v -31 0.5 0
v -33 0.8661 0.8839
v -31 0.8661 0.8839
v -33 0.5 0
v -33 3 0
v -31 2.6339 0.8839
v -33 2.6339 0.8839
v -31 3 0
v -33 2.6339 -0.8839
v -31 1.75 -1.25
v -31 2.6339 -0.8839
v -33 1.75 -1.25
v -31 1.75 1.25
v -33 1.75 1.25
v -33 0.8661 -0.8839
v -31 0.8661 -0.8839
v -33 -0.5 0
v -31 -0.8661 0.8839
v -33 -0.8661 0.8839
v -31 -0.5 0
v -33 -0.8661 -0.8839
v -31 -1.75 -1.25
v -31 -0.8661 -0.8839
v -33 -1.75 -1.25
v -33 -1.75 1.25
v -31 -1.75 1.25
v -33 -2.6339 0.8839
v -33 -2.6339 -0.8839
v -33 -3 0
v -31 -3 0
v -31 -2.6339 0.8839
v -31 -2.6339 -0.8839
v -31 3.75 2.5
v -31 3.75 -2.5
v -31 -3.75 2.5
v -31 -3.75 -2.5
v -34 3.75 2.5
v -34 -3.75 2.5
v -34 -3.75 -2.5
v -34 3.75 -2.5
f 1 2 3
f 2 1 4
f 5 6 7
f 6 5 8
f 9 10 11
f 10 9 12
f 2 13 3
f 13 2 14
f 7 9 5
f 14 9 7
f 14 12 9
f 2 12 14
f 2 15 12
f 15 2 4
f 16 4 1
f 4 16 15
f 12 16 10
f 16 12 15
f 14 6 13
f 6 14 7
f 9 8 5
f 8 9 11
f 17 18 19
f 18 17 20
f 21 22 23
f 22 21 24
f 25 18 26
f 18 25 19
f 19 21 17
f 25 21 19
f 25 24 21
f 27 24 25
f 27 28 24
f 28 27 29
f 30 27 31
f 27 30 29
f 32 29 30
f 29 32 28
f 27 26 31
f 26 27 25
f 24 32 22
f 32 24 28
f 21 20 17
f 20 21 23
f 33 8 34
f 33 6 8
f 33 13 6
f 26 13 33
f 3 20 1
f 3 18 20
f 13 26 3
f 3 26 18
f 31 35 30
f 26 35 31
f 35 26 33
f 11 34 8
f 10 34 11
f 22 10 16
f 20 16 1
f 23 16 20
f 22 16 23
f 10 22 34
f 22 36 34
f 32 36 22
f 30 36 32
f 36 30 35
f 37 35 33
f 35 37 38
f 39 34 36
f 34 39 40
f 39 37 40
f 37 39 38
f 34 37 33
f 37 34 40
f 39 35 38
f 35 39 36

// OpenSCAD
// file: ../motors/MN5212.scad
use <../utils.scad>

module MN5212(){

	render(){
		translate([0,0, 42.5 / 2 - 23 / 2 - 4.9 - 6])
			cylinder(
				h = 23,
				r = 59 / 2,
				$fa = fa(59 / 2),
				center = true);
		translate([0,0, 42.5 / 2 - 4.9 / 2 - 6])
			cylinder(
				h = 4.9,
				r1 = 59 / 2,
				r2 = 24.8 / 2,
				$fa = fa(59 / 2),
				center = true);
		translate([0,0, - 42.5 / 2 + 5.6 / 2 + 3])
			cylinder(
				h = 5.6,
				r1 = 44 / 2,
				r2 = 59 / 2,
				$fa = fa(59 / 2),
				center = true);
		translate([0, 0, 42.5 / 2 - 3])
			cylinder(
				h = 6,
				r = 4 / 2,
				$fa = fa(4 / 2),
				center = true);
		translate([0, 0, - 42.5 / 2 + 1.5])
			cylinder(
				h = 3,
				r = 6 / 2,
				$fa = fa(6 / 2),
				center = true);
	}

}
// file: ../servos/HS_5065MG.scad
use <../utils.scad>

module HS_5065MG(){

	length = 23.75;
	width = 11.68;
	depth = 20.32;
	wing_width = 32.38;
	wing_thick = 3.43;
	shaft_offset = 6;
	hole_spacing = 28.32;
	shaft_height = 26.16;
	shaft_length = 2;

	module mounting_hole(){
		mh_rad = 2 / 2;
		translate(
			[
				hole_spacing / 2,
				0,
				depth / 2 - wing_thick / 2
			])
			cylinder(h = 5, r = mh_rad, $fa = fa(mh_rad), center = true);
	}

	difference(){
		union(){
			cube([length, width, depth], center = true);
			translate([0, 0, depth / 2 - wing_thick / 2])
				cube([wing_width, width, wing_thick], center = true);
			translate(
				[
					- length / 2 + shaft_offset,
					0,
					shaft_height - length / 2 + shaft_length / 2
				])
				cylinder(
					h = shaft_length,
					r = 1.5,
					$fa = fa(1.5),
					center = true);
		}	union(){

			mounting_hole();
			mirror() mounting_hole();
		}
	}
}

HS_5065MG();
// file: ../servos/LS_0006_servo.scad
// Author Michael Marques (DrYerzinia)

use <../utils.scad>

module ls_0006_servo(){
	
	length = 21.4;
	depth = 19.9;
	thickness = 11.65;

	gear_height = 2.6;
	gear_bump_height = 0.7;
	gear_bump_diameter = 1.97;
	gear_outer_bump_diameter = 6;
	gear_bump_offset = 12.2;

	shaft_height = 2.4;
	shaft_diameter = 3.74;
	shaft_offset = thickness / 2;
	shaft_screw_diameter = 1.3;
	
	wing_outer_width = 8.5;
	wing_top_off = 3.8;
	wing_length = 3.8;
	wing_thickness = 1.2;
	wing_hole_diameter = 1.85;
	wing_hole_edge_dist = 2;

	module wing_hole(){
		translate(
			[
				length / 2 + wing_hole_edge_dist,
				0,
				depth/2 - wing_top_off - wing_thickness / 2
			])
			cylinder(
				h = wing_thickness + 1,
				r = wing_hole_diameter / 2,
				$fn = 16,
				center = true);
	}

	module wing(){
		translate(
			[
				length / 2,
				thickness / 2,
				depth/2 - wing_top_off - wing_thickness
			])
			rotate([0,0,-90])
				trapezoid(
					thickness,
					wing_outer_width,
					wing_length,
					wing_thickness);
	}

	// Body
	cube([length, thickness, depth], center = true);

	difference(){
		union(){

			wing();
			mirror() wing();

			// Gear Bumps
			translate([0, 0, depth/2 + gear_height / 2]){
				translate([length / 2 - gear_bump_offset, 0, 0])
					cylinder(
						h = gear_height,
						r = gear_outer_bump_diameter / 2,
						$fn = 16,
						center = true);
				translate([length / 2 - gear_bump_offset, 0, gear_height/2 + gear_bump_height / 2])
					cylinder(
						h = gear_bump_height,
						r = gear_bump_diameter / 2,
						$fn = 16,
						center = true);
				translate([length / 2 - shaft_offset, 0, 0])
					cylinder(
						h = gear_height,
						r = thickness / 2,
						$fn = 32,
						center = true);
				// Shaft
				translate([length / 2 - shaft_offset, 0, gear_height])
					cylinder(
						h = shaft_height,
						r = shaft_diameter / 2,
						$fn = 16,
						center = true);
			}

		}
		union(){

			wing_hole();
			mirror() wing_hole();

			// Shaft_hole
			translate(
				[
					length / 2 - shaft_offset,
					0,
					depth/2 + gear_height * (3 / 2) + 0.5])
				cylinder(
					h = shaft_height + 1,
					r = shaft_screw_diameter / 2,
					$fn = 16,
					center = true);

		}
	}

}

module translate_ls_0006_attachment(){

	length = 21.4;
	thickness = 11.65;
	shaft_offset = thickness / 2;
	depth = 19.9;
	float = 3.3;

	translate([length / 2 - shaft_offset, 0, depth / 2 + float])
		children();

}

module bar_attachment(){

	height = 3.75;
	bar_length = 14.7;
	bar_thickness = 1.6;
	inner_radius = 5.9;
	outer_radius = 3.95;
	shaft_diameter = 3.7;
	upper_void_diameter = 4.8;
	screw_diameter = 2;
	hole_spacing = 2;
	hole_4_diameter = 1.2;
	hole_diameter = 1;
	hole_start_off = 4.7;
	top_void_depth = 0.67;
	bottom_void_depth = 1.84;

	translate([0, 0, height / 2]){
		difference(){
			union(){

				translate([0, inner_radius / 2, height / 2 - bar_thickness])
					rotate([0,0,-90])
						trapezoid(
							inner_radius,
							outer_radius,
							bar_length,
							bar_thickness);

				cylinder(
					h = height,
					r = inner_radius / 2,
					$fn = 16,
					center = true);

				translate([bar_length, 0, height / 2 - bar_thickness / 2])
					cylinder(
						h = bar_thickness,
						r = outer_radius / 2,
						$fn = 16,
						center = true);

			}
			union(){
				// screwhole
				cylinder(
					h = height + 1,
					r = screw_diameter / 2,
					$fn = 16,
					center = true);
				// voids
				translate([0, 0, height / 2 - top_void_depth / 2 + 0.5])
					cylinder(
						h = top_void_depth + 1,
						r = upper_void_diameter / 2,
						$fn = 16,
						center = true);
				translate([0, 0,  - bottom_void_depth / 2 - 0.5])
					cylinder(
						h = bottom_void_depth + 1,
						r = shaft_diameter / 2,
						$fn = 16,
						center = true);

				for(i = [0:4]){
					dia = (i != 3) ? hole_diameter : hole_4_diameter;
					translate(
						[
							hole_start_off + hole_spacing * i,
							0,
							height / 2 - bar_thickness / 2])
						cylinder(
							h = bar_thickness + 1,
							r = dia / 2,
							$fn = 16,
							center = true);
				}

			}
		}
	}

}

ls_0006_servo();
translate_ls_0006_attachment() bar_attachment();
// file: ../servos/parallax_continuous_rotation_servo.scad
// Author Michael Marques (DrYerzinia)

module parallax_continuous_rotation_servo(){

	depth = 37.7;
	length = 40.75;
	width = 19.75;

	mount_height = 2.7;
	mount_extent = 6.1;
	mount_from_top = 7.7;

	mount_hole_diameter = 4.46;
	mount_hole_spacing = 14.4 - mount_hole_diameter;

	shaft_diameter = 5.8;
	shaft_offset = 10;
	shaft_length = 3.5;

	module mounting_hole(){

			translate(
				[
					length / 2 + 5,
					mount_hole_spacing / 2,
					depth / 2 - mount_height / 2 - mount_from_top
				]
				)
				cylinder(
					h = mount_height + 1,
					r = mount_hole_diameter / 2,
					$fn=16,
					center = true);
	}

	difference(){
		union(){

			// Body
			cube([length,width,depth], center = true);

			// Mounting wings
			translate(
				[
					0,
					0,
					depth / 2 - mount_height / 2 - mount_from_top
				])
				cube(
					[
						length + mount_extent * 2,
						width,
						mount_height
					],
					center = true);

			// Shaft
			translate(
				[
					length / 2 - shaft_offset,
					0,
					depth / 2 + shaft_length / 2
				]
				)
				cylinder(
					h = shaft_length,
					r = shaft_diameter / 2,
					$fn = 16,
					center = true
				);

		}
		union(){

			// Mounting Holes
			mounting_hole();
			mirror()
				mounting_hole();

			translate([0,-mount_hole_spacing,0]){
				mounting_hole();
				mirror()
					mounting_hole();
			}
		}
	}

}

module translate_shaft(){

	depth = 37.7;
	length = 40.75;

	shaft_offset = 10;

	translate(
		[
			length / 2 - shaft_offset,
			0,
			depth / 2
		])
		children();
}

module round_servo_attachment(){

	height = 6;
	diameter = 20.8;
	inner_diameter = 8.6;
	plate_thickness = 2.45;

	float = 2;

	depth = 37.7;
	length = 40.75;

	shaft_offset = 10;

	plate_hole_spacing = 14.5;
	plate_hole_diameter = 1.4;
	plate_hole_minor_spacing = 3.5;

	screw_hole_diameter = 3;

	inner_diameter = 8;
	
	top_depth = 1.8;
	bottom_depth = 3.4;

	void_diameter = 5.8;

	module plate_hole(){
		cylinder(
			h = plate_thickness + 1,
			r = plate_hole_diameter / 2,
			$fn = 16,
			center = true
		);
	}

	module plate_hole_group(){
		translate([0, 0, height / 2 - plate_thickness / 2]){
			translate([0, plate_hole_spacing / 2, 0]){
					plate_hole();
					translate([- plate_hole_minor_spacing, 0, 0])
						plate_hole();
					translate([  plate_hole_minor_spacing, 0, 0])
						plate_hole();
			}
		}
	}

	translate(
		[
			length / 2 - shaft_offset,
			0,
			depth / 2 + height / 2 + float
		]
		)
		difference(){

			union(){

				// inner shaft
				cylinder(
					h = height,
					r = inner_diameter / 2,
					$fn = 16,
					center = true
				);

				// top
				translate([0, 0, height / 2 - plate_thickness / 2])
					cylinder(
						h = plate_thickness,
						r = diameter / 2,
						$fn = 32,
						center = true
					);
			}

			union(){

				// plate holes
				for(ang = [0:3]){
					rotate([0,0, ang * 90])
						plate_hole_group();
				}

				// screw hole
				cylinder(
					h = height + 1,
					r = screw_hole_diameter / 2,
					$fn = 16,
					center = true
				);

				// inner voids
				translate([0, 0, height / 2 - top_depth / 2 + 1])
					cylinder(
						h = top_depth + 1,
						r = void_diameter / 2,
						$fn = 16,
						center = true
					);
				translate([0, 0, -1])
					cylinder(
						h = bottom_depth + 1,
						r = void_diameter / 2,
						$fn = 16,
						center = true
					);

			}

		}

}

parallax_continuous_rotation_servo();
round_servo_attachment();
// file: ../hardware.scad
 // Author Michael Marques (DrYerzinia)

// http://www.ebay.com/itm/10-PCS-683-3x7x2-mm-Metal-OPEN-PRECISION-Miniature-Ball-Bearing-3-7-2-/291206307942?hash=item43cd3fa066:m:mCi6eovrGVk_CjIUjlhw8yg
// E-Bay empire.rc

module washer_M3_7x3_2x0_5mm(){

	difference(){
		cylinder(
			h = 0.5,
			r = 7 / 2,
			$fn = 16,
			center = true);
		cylinder(
			h = 0.5 + 0.1,
			r = 3.2 / 2,
			$fn = 16,
			center = true);
	}

}

module bearing_3x7x2mm(){

	difference(){
		cylinder(
			h = 2,
			r = 7 / 2,
			$fn = 16,
			center = true);
		cylinder(
			h = 2 + 1,
			r = 3 / 2,
			$fn = 16,
			center = true);
	}

}

module bearing_5x8x2_5mm(){

	difference(){
		cylinder(
			h = 2.5,
			r = 8 / 2,
			$fn = 16,
			center = true);
		cylinder(
			h = 2.5 + 1,
			r = 5 / 2,
			$fn = 16,
			center = true);
	}

}

module bearing_8x16x5mm(){

	difference(){
		cylinder(
			h = 5,
			r = 16 / 2,
			$fn = 16,
			center = true);
		cylinder(
			h = 5 + 1,
			r = 8 / 2,
			$fn = 16,
			center = true);
	}

}


bearing_5x8x2_5mm();
// file: ../utils.scad
// http://forum.openscad.org/Creating-pie-pizza-slice-shape-need-a-dynamic-length-array-td3148.html

module pie_slice(r, start_angle, end_angle) {
    R = r * sqrt(2) + 1;
    a0 = (4 * start_angle + 0 * end_angle) / 4;
    a1 = (3 * start_angle + 1 * end_angle) / 4;
    a2 = (2 * start_angle + 2 * end_angle) / 4;
    a3 = (1 * start_angle + 3 * end_angle) / 4;
    a4 = (0 * start_angle + 4 * end_angle) / 4;
    if(end_angle > start_angle)
        intersection() {
        circle(r, $fa = fa(r));
        polygon([
            [0,0],
            [R * cos(a0), R * sin(a0)],
            [R * cos(a1), R * sin(a1)],
            [R * cos(a2), R * sin(a2)],
            [R * cos(a3), R * sin(a3)],
            [R * cos(a4), R * sin(a4)],
            [0,0]
       ]);
    }
}

// https://github.com/openscad/openscad/issues/29

module rotate_about(v,a) {
	translate(v) rotate(a) translate(-v) children(0);
}

module rotate_about_axis(v, ang, axis) {
	translate(v) rotate(ang, axis) translate(-v) children(0);
}

// https://github.com/robofun/openscad-utils/blob/master/trapezoid.scad

module trapezoid(width_base, width_top,height,thickness) {
	

  linear_extrude(height = thickness) polygon(points=[[0,0],[width_base,0],[width_base-(width_base-width_top)/2,height],[(width_base-width_top)/2,height]], paths=[[0,1,2,3]]); 
  
}

// http://forum.openscad.org/fe-Tolerance-based-arc-approximation-td14212.html

function fa(r)=($fn>0)?360/$fn:($fe>0)?($fe<r)?min(45,2*acos(1-$fe/r)):45:$fa; 
// file: ../render_settings.scad
// Author Michael Marques (DrYerzinia)

// Lulzbot Mini tolerances
// x/y 0.1mm
// z   0.05mm
//
// 0.1mm   preview tolerance
// 0.025mm export  tolerance

$fs = 0.01;
$fn = undef;
$fa = 360 / 5;

$fe = 0.025;	// export
// main file
// Author Michael Marques (DrYerzinia)

include <../render_settings.scad>

use <../BB8.scad>

Door_P10_cover_slide_brace();
